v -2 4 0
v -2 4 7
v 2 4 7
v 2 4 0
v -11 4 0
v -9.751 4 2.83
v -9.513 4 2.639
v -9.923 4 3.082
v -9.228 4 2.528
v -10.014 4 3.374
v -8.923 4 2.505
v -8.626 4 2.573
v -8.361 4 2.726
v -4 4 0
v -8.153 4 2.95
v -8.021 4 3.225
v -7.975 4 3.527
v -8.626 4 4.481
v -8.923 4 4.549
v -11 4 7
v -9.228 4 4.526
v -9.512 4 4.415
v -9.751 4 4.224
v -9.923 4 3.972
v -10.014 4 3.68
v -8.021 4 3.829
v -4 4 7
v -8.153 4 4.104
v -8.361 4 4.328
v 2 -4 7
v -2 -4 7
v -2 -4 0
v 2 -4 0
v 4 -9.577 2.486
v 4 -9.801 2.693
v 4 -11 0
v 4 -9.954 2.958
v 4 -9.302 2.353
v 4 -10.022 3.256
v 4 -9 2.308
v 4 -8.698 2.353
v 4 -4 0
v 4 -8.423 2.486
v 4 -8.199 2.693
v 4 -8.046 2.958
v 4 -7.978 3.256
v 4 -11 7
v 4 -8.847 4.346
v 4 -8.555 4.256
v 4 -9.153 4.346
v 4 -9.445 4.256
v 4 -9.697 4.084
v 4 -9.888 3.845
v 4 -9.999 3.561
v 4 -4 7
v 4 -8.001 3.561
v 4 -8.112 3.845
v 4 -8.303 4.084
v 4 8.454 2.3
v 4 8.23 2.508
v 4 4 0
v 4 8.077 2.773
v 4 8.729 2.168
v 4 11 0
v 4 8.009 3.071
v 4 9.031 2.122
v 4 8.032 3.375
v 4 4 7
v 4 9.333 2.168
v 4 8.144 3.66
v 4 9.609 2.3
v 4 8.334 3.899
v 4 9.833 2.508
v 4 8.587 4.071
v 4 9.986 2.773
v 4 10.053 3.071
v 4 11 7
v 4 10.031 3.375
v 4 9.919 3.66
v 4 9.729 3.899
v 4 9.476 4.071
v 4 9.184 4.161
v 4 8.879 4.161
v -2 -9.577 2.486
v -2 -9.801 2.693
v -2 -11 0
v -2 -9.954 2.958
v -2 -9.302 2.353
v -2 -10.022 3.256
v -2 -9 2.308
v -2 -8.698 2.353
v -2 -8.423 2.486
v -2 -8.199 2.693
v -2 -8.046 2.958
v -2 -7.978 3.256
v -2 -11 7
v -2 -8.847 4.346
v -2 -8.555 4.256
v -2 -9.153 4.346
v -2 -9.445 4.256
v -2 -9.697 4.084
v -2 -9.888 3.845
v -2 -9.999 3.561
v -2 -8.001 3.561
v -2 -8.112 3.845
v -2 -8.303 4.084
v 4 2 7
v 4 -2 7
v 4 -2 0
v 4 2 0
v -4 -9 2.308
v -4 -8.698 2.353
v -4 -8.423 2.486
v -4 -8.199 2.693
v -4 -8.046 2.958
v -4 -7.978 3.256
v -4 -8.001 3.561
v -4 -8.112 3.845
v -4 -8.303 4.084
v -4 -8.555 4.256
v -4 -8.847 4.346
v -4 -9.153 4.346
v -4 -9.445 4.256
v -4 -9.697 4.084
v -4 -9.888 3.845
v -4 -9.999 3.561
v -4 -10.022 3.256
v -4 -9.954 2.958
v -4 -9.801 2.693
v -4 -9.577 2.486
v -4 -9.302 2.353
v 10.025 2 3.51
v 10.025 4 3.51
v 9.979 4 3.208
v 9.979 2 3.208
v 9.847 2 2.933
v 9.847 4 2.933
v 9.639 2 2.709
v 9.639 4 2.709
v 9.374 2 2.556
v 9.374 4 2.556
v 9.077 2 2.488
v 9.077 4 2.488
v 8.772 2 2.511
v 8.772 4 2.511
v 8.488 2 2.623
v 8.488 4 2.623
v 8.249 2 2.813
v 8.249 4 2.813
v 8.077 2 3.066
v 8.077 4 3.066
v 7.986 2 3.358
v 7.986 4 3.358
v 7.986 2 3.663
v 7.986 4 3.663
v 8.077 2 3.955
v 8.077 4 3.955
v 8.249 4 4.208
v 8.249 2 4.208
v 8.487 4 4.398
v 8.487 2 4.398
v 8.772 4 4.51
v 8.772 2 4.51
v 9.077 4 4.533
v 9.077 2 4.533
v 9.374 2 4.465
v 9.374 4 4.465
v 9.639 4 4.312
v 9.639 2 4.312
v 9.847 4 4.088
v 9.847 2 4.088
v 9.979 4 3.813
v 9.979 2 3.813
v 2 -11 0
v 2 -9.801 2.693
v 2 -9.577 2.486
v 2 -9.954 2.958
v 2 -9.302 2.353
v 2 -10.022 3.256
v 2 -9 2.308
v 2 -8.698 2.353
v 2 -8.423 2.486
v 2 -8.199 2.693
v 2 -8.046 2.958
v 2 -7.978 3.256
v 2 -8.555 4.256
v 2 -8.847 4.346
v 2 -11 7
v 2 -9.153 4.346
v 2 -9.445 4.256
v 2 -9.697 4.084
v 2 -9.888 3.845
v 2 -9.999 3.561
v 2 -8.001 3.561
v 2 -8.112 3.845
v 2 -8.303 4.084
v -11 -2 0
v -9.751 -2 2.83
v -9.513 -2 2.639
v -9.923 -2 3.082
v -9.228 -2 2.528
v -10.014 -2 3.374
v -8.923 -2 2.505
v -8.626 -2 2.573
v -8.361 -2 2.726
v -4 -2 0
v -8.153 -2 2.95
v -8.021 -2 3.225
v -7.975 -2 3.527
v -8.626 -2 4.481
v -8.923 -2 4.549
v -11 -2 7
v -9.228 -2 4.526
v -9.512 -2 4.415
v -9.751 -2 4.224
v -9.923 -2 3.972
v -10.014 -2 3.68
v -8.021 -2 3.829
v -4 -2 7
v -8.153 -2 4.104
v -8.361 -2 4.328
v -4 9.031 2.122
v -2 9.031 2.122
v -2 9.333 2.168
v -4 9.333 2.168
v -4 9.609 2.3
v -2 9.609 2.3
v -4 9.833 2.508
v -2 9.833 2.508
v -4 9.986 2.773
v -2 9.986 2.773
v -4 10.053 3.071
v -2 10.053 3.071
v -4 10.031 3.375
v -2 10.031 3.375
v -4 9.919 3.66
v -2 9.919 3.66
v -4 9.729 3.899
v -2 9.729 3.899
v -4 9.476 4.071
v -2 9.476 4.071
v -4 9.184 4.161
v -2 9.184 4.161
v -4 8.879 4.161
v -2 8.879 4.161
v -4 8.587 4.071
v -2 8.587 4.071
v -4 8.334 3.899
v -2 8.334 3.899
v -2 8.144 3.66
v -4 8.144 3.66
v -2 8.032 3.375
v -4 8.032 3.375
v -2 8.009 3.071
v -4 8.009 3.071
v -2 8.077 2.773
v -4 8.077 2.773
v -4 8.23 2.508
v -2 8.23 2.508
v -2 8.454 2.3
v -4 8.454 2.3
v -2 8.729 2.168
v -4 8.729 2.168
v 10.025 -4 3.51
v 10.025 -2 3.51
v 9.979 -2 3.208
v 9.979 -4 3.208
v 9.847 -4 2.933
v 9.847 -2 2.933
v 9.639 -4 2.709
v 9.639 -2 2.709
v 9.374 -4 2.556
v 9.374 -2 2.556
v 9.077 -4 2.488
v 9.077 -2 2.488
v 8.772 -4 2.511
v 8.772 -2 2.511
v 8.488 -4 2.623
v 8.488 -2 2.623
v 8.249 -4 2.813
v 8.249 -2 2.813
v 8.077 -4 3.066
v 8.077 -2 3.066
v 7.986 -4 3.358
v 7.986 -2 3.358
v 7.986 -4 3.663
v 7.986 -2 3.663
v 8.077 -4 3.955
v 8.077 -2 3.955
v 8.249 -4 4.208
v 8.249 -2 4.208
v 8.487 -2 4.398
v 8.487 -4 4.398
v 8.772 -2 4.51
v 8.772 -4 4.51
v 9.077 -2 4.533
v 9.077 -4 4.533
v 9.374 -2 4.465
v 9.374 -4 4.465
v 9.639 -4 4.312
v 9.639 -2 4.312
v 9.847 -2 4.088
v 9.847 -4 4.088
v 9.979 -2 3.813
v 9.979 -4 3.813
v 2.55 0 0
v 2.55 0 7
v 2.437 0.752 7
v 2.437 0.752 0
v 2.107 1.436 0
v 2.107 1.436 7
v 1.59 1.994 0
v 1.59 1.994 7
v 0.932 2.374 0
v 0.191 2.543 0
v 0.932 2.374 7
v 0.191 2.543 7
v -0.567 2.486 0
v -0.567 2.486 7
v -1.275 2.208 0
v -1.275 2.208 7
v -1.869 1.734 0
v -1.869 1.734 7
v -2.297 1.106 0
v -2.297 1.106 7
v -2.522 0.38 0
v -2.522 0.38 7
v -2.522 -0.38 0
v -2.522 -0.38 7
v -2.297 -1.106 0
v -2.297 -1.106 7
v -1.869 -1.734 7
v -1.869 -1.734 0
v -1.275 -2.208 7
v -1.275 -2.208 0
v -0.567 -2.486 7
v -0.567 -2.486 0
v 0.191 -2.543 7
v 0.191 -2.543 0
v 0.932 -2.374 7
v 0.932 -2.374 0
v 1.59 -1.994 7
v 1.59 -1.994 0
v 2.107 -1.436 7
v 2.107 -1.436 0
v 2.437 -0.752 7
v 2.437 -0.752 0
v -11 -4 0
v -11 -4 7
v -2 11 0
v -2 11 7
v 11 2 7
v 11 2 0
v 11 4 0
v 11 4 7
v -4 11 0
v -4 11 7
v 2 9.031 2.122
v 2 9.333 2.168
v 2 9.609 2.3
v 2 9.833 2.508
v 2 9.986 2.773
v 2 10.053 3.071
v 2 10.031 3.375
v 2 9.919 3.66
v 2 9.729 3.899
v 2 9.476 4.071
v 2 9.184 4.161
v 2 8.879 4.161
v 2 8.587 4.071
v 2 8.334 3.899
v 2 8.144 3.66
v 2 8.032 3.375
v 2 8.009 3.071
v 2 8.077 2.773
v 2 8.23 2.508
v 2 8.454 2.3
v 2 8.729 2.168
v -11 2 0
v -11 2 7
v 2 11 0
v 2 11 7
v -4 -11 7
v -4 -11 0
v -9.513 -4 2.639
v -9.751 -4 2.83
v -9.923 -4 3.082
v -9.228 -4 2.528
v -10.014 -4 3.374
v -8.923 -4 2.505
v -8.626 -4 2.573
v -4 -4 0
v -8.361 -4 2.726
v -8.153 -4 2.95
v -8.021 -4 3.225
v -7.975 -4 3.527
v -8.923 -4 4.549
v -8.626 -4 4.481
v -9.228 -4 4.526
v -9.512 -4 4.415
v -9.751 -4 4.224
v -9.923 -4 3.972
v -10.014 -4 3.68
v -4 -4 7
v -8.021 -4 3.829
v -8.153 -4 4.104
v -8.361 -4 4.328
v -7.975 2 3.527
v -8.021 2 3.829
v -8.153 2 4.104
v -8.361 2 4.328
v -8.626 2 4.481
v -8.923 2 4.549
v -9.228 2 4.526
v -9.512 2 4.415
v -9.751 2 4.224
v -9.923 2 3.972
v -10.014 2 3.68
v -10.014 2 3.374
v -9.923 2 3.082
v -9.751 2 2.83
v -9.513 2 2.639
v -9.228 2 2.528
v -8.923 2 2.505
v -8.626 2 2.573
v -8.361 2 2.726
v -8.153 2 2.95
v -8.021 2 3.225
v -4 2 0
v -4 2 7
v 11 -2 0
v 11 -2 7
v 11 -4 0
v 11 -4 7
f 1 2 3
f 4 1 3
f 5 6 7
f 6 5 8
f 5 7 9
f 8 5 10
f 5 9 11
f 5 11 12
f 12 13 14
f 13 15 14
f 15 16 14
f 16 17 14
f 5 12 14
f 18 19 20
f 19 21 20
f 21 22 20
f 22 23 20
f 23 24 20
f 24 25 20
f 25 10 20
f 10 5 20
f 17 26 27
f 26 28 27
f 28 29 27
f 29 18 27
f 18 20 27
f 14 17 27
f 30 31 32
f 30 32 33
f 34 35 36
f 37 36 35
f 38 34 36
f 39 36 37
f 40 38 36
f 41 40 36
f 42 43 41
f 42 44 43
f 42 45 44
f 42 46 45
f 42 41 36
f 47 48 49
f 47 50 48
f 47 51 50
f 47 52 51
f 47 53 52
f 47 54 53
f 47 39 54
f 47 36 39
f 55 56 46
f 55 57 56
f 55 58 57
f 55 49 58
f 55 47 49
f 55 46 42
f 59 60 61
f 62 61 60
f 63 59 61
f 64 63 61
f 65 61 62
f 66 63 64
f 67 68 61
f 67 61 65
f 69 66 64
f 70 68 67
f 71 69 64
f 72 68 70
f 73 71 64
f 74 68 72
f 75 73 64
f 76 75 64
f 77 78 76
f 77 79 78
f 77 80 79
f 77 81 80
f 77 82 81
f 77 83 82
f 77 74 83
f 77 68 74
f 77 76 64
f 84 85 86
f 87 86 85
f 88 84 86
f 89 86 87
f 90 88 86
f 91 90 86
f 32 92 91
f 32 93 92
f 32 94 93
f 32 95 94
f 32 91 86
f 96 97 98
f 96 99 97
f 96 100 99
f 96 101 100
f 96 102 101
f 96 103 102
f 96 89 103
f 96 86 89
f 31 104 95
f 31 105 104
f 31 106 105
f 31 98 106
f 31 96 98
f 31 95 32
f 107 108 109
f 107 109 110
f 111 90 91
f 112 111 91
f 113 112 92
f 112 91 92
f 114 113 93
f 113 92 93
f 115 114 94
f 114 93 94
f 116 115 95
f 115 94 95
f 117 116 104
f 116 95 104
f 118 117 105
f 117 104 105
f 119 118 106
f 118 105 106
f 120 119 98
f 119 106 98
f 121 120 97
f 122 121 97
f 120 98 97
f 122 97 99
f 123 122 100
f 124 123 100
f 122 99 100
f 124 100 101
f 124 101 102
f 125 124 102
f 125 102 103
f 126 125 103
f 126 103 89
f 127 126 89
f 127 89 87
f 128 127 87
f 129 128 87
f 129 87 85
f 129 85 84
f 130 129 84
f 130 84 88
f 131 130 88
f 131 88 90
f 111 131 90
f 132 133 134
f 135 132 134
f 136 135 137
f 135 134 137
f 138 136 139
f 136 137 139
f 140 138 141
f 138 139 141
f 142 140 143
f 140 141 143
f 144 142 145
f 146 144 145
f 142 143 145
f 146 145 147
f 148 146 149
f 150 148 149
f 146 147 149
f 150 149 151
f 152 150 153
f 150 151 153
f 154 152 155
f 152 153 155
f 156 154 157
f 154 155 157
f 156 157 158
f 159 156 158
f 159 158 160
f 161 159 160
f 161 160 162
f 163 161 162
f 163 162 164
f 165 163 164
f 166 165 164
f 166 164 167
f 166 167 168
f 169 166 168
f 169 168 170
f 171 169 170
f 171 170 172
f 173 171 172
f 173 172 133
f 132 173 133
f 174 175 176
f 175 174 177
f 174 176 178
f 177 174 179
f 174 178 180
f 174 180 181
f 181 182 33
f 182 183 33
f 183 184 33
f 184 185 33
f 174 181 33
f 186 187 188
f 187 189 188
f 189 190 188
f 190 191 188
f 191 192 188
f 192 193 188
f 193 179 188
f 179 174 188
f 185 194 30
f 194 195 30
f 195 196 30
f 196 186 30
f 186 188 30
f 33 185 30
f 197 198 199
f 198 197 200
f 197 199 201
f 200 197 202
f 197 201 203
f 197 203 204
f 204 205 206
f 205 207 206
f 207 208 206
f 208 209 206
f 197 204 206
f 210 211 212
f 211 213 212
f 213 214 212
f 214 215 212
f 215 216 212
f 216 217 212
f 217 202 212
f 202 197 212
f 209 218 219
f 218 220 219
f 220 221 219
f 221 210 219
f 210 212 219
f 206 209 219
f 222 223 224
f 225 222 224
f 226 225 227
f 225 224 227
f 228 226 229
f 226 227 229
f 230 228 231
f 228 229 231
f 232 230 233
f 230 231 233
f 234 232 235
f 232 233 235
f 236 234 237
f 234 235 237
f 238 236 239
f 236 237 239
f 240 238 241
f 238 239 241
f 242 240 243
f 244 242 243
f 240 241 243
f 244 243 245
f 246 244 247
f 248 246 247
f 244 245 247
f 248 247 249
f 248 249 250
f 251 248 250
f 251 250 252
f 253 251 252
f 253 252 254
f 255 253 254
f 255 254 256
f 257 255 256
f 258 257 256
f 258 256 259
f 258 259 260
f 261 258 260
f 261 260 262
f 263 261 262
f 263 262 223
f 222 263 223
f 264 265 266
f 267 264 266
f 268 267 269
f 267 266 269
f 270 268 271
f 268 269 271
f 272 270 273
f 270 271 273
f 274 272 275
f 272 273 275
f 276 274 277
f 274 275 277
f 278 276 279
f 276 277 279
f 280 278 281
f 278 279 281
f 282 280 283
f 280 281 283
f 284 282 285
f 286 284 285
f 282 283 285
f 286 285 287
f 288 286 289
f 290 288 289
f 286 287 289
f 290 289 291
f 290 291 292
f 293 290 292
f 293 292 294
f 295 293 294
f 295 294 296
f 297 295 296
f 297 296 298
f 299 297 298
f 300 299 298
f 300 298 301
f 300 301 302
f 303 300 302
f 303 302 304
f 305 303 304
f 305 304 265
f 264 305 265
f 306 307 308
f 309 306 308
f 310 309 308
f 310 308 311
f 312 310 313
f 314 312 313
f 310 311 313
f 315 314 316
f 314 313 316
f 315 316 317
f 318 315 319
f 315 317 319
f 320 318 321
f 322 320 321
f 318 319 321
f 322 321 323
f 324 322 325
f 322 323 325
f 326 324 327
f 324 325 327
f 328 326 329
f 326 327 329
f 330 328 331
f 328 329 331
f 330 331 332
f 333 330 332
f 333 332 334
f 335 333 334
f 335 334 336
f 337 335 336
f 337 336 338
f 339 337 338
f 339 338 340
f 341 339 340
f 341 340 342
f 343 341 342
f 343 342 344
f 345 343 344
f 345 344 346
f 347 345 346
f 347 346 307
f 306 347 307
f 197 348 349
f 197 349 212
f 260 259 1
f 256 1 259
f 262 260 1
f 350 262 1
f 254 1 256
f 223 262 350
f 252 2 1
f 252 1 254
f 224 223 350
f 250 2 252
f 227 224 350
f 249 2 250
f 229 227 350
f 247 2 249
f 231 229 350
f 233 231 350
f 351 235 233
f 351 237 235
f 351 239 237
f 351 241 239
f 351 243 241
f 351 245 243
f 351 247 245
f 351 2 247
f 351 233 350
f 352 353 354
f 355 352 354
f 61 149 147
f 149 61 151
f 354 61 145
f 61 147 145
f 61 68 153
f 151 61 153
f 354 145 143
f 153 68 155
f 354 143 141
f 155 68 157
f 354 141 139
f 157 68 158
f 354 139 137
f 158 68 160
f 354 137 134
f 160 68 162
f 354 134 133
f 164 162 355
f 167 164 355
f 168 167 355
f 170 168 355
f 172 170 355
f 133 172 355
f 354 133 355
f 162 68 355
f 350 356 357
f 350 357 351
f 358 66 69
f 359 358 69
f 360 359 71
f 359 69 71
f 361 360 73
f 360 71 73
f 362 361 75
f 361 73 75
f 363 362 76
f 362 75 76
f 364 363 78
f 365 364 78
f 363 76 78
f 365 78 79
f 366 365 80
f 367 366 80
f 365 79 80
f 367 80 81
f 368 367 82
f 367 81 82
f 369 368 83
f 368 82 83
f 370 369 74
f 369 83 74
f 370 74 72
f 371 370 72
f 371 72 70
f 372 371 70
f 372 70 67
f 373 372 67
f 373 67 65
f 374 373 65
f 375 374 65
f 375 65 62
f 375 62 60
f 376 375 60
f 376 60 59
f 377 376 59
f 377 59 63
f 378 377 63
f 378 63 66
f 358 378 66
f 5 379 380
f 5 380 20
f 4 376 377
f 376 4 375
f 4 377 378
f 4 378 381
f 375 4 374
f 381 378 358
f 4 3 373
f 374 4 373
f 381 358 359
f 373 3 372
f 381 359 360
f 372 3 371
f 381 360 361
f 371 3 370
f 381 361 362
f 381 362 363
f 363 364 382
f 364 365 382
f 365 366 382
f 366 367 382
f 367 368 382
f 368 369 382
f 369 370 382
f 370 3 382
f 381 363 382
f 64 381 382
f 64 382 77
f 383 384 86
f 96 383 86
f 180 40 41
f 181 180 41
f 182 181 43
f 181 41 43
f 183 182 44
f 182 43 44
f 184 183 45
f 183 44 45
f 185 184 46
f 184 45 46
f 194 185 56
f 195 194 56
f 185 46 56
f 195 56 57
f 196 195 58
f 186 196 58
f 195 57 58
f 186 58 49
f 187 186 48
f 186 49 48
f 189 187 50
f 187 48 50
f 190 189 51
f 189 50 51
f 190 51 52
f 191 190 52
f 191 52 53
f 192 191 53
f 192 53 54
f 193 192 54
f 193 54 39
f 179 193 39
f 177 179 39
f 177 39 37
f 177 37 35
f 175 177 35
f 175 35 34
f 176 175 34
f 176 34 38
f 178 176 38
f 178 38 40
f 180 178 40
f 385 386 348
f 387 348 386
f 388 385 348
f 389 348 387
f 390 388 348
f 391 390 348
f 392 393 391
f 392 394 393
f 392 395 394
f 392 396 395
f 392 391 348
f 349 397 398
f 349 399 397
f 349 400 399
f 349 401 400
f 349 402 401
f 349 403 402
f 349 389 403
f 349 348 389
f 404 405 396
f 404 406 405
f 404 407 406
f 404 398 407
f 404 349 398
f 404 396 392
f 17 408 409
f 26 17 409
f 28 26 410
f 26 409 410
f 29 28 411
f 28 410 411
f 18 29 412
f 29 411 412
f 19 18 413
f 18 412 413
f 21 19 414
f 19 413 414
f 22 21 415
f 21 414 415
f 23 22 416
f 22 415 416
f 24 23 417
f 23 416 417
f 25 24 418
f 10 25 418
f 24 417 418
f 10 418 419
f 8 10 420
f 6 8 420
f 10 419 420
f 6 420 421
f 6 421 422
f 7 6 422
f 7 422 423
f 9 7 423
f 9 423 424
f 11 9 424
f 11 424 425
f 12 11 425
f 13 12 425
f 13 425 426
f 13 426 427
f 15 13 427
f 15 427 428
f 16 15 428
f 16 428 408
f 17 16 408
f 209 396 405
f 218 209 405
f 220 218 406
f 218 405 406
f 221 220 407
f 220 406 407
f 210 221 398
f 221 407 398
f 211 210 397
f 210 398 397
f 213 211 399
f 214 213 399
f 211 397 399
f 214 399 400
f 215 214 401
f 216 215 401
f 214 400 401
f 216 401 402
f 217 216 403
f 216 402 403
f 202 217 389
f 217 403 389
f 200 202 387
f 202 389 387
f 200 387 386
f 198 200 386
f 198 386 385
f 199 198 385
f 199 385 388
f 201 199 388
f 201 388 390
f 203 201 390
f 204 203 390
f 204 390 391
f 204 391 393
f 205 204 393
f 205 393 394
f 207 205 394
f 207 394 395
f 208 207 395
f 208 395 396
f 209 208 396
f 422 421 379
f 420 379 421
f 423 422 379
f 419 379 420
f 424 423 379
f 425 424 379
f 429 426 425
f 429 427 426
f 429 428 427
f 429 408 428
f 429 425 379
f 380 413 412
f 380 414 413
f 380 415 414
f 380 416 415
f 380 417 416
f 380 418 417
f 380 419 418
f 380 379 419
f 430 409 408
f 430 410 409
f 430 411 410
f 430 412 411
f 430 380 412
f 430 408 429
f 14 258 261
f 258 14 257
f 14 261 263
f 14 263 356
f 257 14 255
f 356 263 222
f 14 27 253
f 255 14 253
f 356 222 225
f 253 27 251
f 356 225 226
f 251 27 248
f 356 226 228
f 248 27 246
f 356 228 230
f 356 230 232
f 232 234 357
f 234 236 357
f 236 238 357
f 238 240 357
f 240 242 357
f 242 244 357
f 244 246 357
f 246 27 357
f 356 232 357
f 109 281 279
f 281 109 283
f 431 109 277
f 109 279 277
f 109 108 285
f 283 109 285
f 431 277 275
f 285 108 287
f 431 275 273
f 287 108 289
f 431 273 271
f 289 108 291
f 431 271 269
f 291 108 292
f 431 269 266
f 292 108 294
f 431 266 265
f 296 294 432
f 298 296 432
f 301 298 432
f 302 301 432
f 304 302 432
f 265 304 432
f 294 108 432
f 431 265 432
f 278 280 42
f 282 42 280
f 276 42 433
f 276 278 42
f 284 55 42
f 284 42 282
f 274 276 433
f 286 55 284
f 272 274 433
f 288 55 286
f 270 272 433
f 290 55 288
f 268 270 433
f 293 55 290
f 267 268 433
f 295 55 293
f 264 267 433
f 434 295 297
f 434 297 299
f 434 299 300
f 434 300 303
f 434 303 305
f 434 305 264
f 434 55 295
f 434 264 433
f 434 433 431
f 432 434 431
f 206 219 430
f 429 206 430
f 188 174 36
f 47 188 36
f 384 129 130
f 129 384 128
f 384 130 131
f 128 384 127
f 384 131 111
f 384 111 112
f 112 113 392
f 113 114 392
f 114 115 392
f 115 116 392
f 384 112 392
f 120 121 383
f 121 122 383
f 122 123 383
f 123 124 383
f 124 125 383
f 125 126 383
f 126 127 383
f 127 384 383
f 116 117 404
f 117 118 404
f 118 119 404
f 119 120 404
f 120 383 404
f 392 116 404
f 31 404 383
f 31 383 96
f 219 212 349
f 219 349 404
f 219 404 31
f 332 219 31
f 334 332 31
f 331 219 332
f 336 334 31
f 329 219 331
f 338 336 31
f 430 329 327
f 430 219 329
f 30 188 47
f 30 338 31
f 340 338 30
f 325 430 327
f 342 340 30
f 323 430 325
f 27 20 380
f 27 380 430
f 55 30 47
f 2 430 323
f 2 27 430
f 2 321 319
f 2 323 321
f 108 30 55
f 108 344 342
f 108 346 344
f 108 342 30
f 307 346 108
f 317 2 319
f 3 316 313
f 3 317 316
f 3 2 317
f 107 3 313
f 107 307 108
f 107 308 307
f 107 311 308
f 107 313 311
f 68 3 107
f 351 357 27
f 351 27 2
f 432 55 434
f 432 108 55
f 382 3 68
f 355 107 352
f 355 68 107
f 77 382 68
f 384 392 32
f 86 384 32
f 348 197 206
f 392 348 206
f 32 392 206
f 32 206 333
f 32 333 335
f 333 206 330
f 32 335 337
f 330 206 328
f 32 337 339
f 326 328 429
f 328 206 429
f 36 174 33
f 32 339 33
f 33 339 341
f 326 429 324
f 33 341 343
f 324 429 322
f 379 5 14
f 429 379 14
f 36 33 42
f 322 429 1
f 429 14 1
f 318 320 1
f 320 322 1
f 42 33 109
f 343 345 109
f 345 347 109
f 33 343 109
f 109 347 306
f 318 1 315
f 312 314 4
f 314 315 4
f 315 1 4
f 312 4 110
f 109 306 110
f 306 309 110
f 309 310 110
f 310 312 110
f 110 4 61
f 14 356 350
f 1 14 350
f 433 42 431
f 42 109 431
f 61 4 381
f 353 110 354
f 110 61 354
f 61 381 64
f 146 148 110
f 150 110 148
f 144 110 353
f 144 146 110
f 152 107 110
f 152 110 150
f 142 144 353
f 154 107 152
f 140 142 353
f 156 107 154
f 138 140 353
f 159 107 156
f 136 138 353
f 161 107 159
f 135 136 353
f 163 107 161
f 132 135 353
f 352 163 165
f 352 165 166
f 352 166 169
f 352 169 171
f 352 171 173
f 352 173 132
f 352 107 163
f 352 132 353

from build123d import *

# Parameters (mm, degrees)
SKETCH1_W       = 22
SKETCH1_H       = 22
EXTRUDE1_DEPTH  = 7
SKETCH2_W       = 7
SKETCH2_H       = 7
EXTRUDE2_DEPTH  = 7
SKETCH3_W       = 7
SKETCH3_H       = 4
SKETCH3_W_2     = 4
SKETCH3_H_2     = 7
EXTRUDE3_DEPTH  = 7
SKETCH4_W       = 4
SKETCH4_H       = 4
EXTRUDE5_DEPTH  = 7
SKETCH5_R       = 2.55
EXTRUDE6_DEPTH  = 10
SKETCH6_R       = 1.025
EXTRUDE7_DEPTH  = 10
SKETCH7_R       = 1.025
EXTRUDE8_DEPTH  = 10
SKETCH8_R       = 1.025
EXTRUDE9_DEPTH  = 10
SKETCH9_R       = 1.025
EXTRUDE10_DEPTH = 10


with BuildPart() as part:
    # Sketch1 → Extrude1 (new body)
    with BuildSketch(Plane.XY):
        Rectangle(SKETCH1_W, SKETCH1_H)
    extrude(amount=EXTRUDE1_DEPTH)

    # Sketch2 → Extrude2 (cut)
    with BuildSketch(Plane.XY.offset(7)):
        with Locations((7.5, 7.5)):
            Rectangle(SKETCH2_W, SKETCH2_H)
        with Locations((-7.5, 7.5)):
            Rectangle(SKETCH2_W, SKETCH2_H)
        with Locations((-7.5, -7.5)):
            Rectangle(SKETCH2_W, SKETCH2_H)
        with Locations((7.5, -7.5)):
            Rectangle(SKETCH2_W, SKETCH2_H)
    extrude(amount=-EXTRUDE2_DEPTH, mode=Mode.SUBTRACT)

    # Sketch3 → Extrude3 (cut)
    with BuildSketch(Plane.XY.offset(7)):
        with Locations((-7.5, 0)):
            Rectangle(SKETCH3_W, SKETCH3_H)
        with Locations((0, 7.5)):
            Rectangle(SKETCH3_W_2, SKETCH3_H_2)
        with Locations((7.5, 0)):
            Rectangle(SKETCH3_W, SKETCH3_H)
        with Locations((0, -7.5)):
            Rectangle(SKETCH3_W_2, SKETCH3_H_2)
        Rectangle(SKETCH3_W_2, SKETCH3_H)
    extrude(amount=-EXTRUDE3_DEPTH, mode=Mode.SUBTRACT)

    # Sketch4 → Extrude5 (add)
    with BuildSketch(Plane.XY.offset(7)):
        Rectangle(SKETCH4_W, SKETCH4_H)
    extrude(amount=-EXTRUDE5_DEPTH)

    # Sketch5 → Extrude6 (cut)
    with BuildSketch(Plane.XY.offset(7)):
        Circle(SKETCH5_R)
    extrude(amount=-EXTRUDE6_DEPTH, mode=Mode.SUBTRACT)

    # Sketch6 → Extrude7 (cut)
    with BuildSketch(Plane(origin=(4, 0, 0), x_dir=(0, 0, -1), z_dir=(1, 0, 0))):
        with Locations((-3.14721043, 9.031360998)):
            Circle(SKETCH6_R)
    extrude(amount=-EXTRUDE7_DEPTH, mode=Mode.SUBTRACT)

    # Sketch7 → Extrude8 (cut)
    with BuildSketch(Plane.XZ.offset(4)):
        with Locations((-9, 3.526976634)):
            Circle(SKETCH7_R)
    extrude(amount=-EXTRUDE8_DEPTH, mode=Mode.SUBTRACT)

    # Sketch8 → Extrude9 (cut)
    with BuildSketch(Plane(origin=(4, 0, 0), x_dir=(0, 0, -1), z_dir=(1, 0, 0))):
        with Locations((-3.332535344, -9)):
            Circle(SKETCH8_R)
    extrude(amount=-EXTRUDE9_DEPTH, mode=Mode.SUBTRACT)

    # Sketch9 → Extrude10 (cut)
    with BuildSketch(Plane(origin=(0, 4, 0), x_dir=(1, 0, 0), z_dir=(0, 1, 0))):
        with Locations((9, -3.510451641)):
            Circle(SKETCH9_R)
    extrude(amount=-EXTRUDE10_DEPTH, mode=Mode.SUBTRACT)


solid = part.part
